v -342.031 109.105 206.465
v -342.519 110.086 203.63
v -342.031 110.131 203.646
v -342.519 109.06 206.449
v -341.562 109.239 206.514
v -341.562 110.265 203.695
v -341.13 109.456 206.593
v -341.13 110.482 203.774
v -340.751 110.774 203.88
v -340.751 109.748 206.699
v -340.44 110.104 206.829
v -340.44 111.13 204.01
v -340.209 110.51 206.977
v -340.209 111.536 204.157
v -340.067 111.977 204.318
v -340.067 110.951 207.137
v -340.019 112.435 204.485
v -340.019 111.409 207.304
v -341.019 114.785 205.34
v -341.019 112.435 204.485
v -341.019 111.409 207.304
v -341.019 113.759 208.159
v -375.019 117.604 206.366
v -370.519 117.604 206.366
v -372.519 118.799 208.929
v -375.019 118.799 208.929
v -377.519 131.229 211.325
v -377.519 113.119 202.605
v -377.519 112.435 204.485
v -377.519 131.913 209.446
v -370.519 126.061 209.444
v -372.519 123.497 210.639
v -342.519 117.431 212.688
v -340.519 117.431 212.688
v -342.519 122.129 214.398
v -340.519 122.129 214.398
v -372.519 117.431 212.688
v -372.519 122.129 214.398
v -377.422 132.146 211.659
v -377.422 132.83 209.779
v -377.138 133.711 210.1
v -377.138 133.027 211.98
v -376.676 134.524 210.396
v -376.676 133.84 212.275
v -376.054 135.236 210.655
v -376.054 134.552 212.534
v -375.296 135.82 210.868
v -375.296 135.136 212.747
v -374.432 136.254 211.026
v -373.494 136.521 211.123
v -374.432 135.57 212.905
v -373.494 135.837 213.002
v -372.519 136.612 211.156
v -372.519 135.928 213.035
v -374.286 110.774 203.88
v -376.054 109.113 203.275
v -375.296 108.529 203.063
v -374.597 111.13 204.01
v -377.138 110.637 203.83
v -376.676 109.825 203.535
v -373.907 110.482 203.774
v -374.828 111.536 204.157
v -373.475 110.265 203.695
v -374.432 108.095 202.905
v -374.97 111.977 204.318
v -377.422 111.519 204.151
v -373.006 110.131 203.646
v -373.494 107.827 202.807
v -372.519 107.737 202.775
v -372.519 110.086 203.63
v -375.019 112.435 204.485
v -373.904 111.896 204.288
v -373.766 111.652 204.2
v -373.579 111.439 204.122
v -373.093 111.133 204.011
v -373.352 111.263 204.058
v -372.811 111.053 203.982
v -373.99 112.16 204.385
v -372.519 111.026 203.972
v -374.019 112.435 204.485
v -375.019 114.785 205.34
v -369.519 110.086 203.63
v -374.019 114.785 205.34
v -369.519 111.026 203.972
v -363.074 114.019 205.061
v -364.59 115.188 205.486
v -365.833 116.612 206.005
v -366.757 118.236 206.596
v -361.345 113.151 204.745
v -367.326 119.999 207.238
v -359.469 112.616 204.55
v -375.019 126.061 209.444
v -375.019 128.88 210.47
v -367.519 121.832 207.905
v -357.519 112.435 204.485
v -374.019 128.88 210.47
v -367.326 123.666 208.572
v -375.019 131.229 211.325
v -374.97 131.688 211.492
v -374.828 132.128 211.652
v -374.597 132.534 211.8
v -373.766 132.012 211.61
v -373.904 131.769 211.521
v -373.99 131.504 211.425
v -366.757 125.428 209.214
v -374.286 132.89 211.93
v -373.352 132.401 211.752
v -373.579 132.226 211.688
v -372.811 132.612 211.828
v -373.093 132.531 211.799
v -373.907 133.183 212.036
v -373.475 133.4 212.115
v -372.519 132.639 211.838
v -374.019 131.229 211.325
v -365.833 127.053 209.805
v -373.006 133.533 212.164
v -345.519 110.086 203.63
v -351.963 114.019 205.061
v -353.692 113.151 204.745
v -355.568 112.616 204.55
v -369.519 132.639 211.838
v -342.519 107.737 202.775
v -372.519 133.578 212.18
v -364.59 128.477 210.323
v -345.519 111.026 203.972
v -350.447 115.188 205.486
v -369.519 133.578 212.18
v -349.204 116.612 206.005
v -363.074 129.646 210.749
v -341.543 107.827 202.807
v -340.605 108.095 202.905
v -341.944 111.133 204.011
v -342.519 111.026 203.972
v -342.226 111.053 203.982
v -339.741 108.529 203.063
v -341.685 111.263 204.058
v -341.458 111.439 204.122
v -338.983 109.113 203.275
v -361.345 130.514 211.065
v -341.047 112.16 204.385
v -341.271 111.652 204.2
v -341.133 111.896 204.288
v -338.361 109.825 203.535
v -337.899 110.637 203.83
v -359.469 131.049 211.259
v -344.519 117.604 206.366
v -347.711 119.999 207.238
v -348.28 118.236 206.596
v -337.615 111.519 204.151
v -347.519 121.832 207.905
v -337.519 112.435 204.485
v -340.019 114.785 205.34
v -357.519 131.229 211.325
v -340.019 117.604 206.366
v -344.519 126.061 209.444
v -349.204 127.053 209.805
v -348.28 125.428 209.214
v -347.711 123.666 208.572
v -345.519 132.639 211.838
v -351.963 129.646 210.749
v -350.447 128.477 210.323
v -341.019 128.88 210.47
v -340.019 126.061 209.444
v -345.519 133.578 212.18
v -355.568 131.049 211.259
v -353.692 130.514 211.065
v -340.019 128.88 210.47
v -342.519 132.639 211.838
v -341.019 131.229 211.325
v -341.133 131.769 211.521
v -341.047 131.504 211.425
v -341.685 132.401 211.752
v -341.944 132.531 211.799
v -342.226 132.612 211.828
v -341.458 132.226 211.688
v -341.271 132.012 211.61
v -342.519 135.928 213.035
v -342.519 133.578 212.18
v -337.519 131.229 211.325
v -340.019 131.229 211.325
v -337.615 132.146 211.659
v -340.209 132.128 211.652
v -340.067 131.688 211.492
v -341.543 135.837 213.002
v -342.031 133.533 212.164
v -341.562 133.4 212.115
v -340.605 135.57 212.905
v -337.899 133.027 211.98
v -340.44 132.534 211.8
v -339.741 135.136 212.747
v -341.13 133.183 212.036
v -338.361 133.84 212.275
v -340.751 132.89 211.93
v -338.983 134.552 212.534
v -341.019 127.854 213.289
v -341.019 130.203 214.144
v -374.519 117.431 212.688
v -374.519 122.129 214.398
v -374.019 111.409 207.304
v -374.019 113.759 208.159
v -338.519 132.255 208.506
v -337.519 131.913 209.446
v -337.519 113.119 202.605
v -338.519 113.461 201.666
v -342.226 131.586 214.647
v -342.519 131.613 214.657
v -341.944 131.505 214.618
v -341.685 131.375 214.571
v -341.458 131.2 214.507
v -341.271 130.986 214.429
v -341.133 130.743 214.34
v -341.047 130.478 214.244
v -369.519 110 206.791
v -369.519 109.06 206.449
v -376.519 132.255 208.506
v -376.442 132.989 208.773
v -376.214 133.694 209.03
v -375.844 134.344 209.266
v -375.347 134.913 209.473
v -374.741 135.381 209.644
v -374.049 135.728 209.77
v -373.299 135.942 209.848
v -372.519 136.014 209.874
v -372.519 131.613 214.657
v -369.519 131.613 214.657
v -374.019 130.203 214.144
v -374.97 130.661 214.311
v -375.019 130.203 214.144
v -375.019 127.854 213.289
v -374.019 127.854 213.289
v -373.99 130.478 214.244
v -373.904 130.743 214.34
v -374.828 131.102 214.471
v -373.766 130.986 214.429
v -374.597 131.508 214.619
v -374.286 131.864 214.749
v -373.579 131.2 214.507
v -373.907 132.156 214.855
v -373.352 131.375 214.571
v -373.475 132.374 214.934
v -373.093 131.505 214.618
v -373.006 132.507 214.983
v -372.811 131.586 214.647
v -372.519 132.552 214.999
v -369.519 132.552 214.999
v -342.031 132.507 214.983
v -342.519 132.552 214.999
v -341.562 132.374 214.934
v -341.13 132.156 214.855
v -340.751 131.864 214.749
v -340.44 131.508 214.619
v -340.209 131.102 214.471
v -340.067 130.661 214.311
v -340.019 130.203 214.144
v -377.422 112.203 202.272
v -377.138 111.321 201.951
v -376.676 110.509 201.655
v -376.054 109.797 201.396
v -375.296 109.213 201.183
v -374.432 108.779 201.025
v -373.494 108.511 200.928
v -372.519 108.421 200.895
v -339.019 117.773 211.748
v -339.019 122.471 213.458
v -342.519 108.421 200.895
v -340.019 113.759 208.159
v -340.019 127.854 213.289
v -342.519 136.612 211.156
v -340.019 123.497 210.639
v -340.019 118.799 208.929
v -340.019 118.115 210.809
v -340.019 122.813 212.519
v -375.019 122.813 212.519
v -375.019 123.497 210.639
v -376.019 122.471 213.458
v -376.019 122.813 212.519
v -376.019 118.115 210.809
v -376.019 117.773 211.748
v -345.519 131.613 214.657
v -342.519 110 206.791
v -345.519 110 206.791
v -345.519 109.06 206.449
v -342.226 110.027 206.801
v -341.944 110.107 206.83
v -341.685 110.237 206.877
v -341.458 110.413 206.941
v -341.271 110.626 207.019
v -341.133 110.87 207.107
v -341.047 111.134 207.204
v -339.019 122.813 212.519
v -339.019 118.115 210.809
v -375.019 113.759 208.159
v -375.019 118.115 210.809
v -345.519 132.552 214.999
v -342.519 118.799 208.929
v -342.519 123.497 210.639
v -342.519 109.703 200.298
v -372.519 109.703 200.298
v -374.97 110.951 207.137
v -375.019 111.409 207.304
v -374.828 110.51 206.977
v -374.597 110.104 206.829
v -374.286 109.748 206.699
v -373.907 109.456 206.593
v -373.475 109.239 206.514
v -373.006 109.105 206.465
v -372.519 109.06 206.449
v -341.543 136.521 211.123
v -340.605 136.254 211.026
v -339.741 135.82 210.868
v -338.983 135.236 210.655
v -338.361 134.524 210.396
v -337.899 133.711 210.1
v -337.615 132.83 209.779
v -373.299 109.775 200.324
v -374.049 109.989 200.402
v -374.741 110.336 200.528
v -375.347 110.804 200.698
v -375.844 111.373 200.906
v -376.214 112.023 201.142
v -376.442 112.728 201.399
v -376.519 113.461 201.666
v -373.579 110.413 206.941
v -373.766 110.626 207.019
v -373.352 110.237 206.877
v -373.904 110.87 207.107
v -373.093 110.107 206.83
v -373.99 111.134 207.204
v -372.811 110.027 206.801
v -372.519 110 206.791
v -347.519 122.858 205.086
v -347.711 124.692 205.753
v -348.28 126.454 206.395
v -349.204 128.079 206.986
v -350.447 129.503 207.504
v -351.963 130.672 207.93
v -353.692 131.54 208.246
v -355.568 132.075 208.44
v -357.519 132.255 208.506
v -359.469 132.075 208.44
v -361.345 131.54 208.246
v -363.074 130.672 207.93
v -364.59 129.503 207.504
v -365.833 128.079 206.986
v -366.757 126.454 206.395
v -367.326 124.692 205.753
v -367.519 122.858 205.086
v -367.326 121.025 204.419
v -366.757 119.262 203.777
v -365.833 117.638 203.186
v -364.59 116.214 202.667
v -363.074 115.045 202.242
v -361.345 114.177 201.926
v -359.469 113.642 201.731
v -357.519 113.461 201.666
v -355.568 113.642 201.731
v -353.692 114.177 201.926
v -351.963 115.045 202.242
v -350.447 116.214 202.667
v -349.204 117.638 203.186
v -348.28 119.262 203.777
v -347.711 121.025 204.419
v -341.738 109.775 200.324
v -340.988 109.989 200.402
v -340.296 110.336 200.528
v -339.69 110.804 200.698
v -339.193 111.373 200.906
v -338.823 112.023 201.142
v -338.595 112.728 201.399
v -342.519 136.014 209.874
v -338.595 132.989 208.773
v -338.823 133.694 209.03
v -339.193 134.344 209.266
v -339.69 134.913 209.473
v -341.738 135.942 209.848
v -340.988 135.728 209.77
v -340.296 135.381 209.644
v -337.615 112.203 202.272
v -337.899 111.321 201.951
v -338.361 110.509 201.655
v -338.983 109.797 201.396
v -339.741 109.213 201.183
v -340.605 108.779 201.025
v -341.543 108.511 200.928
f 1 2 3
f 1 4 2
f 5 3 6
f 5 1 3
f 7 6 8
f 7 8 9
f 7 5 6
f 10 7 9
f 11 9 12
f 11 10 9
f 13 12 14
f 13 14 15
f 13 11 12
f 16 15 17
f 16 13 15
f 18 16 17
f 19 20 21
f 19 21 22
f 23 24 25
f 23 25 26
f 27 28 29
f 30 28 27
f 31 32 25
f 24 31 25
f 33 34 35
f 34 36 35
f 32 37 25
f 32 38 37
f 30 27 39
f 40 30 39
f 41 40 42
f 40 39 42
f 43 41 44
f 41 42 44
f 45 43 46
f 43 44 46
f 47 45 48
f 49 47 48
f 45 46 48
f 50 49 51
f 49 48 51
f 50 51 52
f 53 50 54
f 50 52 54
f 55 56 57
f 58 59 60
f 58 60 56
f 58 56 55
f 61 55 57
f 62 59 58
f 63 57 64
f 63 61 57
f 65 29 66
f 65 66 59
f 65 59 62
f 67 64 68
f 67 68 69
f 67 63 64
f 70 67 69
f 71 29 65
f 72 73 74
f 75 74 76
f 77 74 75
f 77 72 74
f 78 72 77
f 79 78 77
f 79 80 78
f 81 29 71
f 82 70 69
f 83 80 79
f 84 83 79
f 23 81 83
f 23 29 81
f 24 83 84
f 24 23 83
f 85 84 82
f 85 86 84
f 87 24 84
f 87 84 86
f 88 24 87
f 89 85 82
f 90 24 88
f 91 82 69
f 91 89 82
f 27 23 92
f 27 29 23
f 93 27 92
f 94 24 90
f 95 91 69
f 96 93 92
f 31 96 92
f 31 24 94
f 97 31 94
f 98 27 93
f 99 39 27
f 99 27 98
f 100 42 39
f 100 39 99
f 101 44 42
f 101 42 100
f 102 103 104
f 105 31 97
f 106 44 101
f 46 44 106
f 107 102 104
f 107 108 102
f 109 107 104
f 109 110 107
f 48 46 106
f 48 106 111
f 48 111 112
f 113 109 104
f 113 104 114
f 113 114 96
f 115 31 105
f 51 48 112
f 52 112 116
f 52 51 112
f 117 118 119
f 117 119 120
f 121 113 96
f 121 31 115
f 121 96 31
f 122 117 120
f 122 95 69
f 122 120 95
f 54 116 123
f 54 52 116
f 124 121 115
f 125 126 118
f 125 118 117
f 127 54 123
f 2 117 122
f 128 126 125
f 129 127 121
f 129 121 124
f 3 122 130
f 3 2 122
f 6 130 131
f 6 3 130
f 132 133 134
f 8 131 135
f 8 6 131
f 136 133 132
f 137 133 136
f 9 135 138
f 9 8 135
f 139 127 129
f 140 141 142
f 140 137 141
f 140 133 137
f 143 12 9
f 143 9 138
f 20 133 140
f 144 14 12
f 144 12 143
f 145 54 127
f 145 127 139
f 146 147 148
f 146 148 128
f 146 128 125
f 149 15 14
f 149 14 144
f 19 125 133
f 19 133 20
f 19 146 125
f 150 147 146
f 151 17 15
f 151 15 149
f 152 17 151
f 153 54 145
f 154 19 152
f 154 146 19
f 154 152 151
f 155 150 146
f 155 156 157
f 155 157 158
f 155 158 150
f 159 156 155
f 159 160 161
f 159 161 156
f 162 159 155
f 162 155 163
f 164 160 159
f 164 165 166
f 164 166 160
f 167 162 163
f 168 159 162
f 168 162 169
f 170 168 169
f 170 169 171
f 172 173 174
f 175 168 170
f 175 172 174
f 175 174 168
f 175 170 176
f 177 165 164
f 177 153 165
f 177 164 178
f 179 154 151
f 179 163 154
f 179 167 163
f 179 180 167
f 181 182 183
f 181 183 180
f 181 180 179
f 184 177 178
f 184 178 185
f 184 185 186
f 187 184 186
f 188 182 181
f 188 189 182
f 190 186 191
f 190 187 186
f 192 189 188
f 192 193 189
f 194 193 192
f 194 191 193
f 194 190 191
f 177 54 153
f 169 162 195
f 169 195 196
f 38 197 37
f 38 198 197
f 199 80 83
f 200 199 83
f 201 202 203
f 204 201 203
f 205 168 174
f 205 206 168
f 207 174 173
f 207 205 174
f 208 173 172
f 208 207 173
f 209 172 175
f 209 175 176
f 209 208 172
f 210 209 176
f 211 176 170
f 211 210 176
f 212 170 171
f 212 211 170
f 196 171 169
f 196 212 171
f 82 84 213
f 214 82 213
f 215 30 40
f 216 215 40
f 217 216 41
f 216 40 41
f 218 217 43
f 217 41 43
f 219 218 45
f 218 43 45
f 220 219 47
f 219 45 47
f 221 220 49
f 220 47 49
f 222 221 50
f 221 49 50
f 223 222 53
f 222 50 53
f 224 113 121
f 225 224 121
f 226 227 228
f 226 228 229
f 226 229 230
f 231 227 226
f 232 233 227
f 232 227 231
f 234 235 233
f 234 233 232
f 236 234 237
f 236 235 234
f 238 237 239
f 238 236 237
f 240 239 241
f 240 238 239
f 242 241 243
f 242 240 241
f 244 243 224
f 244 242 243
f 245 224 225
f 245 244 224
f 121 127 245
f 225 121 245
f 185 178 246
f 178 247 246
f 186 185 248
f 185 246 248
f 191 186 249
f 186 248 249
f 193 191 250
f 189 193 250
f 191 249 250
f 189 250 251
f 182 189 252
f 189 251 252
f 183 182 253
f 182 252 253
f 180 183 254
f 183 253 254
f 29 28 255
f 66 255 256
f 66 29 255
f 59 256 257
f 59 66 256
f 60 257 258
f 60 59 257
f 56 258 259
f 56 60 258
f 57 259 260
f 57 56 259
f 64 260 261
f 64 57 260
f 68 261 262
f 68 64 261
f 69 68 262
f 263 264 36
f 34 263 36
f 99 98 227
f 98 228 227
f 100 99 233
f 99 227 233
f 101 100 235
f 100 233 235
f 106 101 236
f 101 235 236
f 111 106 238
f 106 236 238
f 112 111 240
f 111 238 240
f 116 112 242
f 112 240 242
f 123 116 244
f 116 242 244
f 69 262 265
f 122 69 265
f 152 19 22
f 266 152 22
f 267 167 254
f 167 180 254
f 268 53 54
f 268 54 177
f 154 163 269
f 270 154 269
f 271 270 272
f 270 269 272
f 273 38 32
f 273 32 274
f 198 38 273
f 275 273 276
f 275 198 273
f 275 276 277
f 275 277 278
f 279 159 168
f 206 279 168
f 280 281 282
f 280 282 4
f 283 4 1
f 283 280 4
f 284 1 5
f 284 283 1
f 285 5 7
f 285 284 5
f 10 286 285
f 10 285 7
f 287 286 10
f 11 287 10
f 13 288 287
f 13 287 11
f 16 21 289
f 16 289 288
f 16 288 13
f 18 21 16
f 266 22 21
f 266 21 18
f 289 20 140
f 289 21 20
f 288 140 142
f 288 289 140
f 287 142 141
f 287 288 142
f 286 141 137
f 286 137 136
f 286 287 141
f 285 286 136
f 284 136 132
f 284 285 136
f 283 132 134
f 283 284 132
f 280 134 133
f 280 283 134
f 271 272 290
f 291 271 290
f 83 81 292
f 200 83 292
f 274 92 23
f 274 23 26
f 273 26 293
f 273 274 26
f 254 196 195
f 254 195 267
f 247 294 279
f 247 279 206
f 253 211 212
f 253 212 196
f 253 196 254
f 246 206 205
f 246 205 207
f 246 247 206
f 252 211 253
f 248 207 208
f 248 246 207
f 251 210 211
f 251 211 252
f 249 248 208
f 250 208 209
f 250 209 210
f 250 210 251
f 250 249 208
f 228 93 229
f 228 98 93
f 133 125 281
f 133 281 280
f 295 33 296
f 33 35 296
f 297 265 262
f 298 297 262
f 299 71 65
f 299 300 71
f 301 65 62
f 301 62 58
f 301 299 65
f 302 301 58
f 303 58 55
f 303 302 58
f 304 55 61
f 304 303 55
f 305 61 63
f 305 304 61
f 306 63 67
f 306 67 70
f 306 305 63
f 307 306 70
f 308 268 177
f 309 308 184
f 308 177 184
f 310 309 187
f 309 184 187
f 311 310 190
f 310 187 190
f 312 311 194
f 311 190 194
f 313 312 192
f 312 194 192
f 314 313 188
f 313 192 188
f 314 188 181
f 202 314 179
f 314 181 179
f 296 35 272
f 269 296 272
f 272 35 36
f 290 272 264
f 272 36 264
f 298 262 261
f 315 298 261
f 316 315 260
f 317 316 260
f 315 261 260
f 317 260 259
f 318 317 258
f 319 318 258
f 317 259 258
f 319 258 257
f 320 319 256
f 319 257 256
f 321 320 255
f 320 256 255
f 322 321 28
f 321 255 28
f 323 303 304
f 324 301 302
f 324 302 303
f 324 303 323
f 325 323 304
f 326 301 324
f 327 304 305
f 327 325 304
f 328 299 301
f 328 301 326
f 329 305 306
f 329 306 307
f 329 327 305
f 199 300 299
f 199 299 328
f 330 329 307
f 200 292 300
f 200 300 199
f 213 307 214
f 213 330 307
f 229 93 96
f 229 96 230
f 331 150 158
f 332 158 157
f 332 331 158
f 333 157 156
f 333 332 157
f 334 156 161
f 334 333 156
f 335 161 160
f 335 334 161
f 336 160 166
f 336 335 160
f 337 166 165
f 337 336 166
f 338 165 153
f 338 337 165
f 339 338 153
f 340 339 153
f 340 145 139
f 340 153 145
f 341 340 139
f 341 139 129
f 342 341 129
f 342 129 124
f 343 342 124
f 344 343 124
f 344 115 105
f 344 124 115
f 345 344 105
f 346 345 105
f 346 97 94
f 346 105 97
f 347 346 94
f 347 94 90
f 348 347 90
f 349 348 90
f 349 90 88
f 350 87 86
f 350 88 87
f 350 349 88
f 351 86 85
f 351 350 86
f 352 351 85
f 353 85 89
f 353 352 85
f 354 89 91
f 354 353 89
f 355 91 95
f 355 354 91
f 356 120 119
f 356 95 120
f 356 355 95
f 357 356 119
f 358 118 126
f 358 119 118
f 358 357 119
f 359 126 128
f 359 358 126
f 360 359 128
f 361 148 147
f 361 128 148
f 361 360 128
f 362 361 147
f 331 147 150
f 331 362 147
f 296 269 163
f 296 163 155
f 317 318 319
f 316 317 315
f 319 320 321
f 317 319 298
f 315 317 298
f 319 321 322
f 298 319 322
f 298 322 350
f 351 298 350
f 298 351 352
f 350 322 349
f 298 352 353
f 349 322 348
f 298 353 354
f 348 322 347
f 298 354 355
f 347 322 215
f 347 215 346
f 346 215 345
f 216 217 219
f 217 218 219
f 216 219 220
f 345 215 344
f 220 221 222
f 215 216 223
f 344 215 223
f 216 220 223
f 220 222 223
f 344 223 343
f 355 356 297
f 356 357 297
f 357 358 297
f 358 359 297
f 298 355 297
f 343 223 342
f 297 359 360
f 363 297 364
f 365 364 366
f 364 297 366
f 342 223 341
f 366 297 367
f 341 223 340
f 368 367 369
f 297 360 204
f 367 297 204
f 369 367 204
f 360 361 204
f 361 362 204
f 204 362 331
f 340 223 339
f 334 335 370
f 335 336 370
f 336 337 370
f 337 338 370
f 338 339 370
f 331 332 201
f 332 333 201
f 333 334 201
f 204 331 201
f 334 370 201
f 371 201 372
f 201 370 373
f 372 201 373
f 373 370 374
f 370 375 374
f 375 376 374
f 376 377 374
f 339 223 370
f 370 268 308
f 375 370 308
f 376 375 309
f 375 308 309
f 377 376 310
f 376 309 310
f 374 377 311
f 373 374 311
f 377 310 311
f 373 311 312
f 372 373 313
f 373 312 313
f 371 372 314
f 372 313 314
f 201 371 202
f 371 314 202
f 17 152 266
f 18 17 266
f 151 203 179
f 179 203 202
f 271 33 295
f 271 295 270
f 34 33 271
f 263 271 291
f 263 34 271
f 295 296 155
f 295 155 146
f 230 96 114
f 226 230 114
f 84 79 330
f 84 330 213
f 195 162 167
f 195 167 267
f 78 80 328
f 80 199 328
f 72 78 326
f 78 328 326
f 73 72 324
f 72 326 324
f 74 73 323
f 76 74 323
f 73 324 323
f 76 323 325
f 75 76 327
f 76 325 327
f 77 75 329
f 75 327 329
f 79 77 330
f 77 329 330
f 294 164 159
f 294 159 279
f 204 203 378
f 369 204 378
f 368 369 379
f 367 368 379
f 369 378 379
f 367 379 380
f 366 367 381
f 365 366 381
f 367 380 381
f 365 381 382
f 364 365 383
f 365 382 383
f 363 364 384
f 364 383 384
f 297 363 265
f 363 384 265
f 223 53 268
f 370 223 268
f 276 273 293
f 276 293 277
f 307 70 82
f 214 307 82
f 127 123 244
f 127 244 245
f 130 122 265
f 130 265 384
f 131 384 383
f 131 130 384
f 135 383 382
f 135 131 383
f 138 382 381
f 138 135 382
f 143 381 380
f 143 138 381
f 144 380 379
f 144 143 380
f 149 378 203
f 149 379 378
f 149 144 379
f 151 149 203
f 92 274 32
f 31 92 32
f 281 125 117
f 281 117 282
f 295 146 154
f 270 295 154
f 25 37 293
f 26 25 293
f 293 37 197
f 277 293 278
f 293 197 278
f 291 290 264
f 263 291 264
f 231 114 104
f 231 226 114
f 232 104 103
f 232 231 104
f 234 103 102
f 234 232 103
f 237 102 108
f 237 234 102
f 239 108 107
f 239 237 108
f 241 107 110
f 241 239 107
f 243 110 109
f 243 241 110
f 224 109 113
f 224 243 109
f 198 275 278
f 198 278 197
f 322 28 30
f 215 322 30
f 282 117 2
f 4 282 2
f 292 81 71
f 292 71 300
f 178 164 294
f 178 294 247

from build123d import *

# Parameters (mm, degrees)
SKETCH117_W             = 40
SKETCH117_H             = 30
SKETCH117_R             = 10
PAD021_DEPTH            = 3
SKETCH118_W             = 35
SKETCH118_H             = 25
SKETCH118_W_2           = 33
SKETCH118_H_2           = 23
PAD022_DEPTH            = 3
FILLET013_R             = 5
FILLET014_R             = 1.5
FILLET016_R             = 2.5
PAD023_DEPTH            = 2.5
SKETCH121_W             = 5
SKETCH121_H             = 3
POCKET043_DEPTH         = 37.501
CHAMFER002_SIZE         = 2
SKETCH122_W             = 24
SKETCH122_H             = 3
POCKET044_DEPTH         = 27.501
CHAMFER003_SIZE         = 1
BODY010_PLACEMENT_ANGLE = 20


with BuildPart() as part:
    # Sketch117 → Pad021 (new body)
    with BuildSketch(Plane.XY):
        Rectangle(SKETCH117_W, SKETCH117_H)
        Circle(SKETCH117_R, mode=Mode.SUBTRACT)
    extrude(amount=PAD021_DEPTH)

    # Sketch118 (on Face7 of Pad021) → Pad022 (join)
    with BuildSketch(Plane.XY.offset(3)):
        Rectangle(SKETCH118_W, SKETCH118_H)
        Rectangle(SKETCH118_W_2, SKETCH118_H_2, mode=Mode.SUBTRACT)
    extrude(amount=PAD022_DEPTH)

    # Fillet013
    fillet013_edges = [part.edges().sort_by_distance(p)[0] for p in [
        (20, -15, 1.5),
        (20, 15, 1.5),
        (-20, 15, 1.5),
        (-20, -15, 1.5),
    ]]
    fillet(fillet013_edges, radius=FILLET013_R)

    # Fillet014
    fillet014_edges = [part.edges().sort_by_distance(p)[0] for p in [
        (16.5, 11.5, 4.5),
        (16.5, -11.5, 4.5),
        (-16.5, -11.5, 4.5),
        (-16.5, 11.5, 4.5),
    ]]
    fillet(fillet014_edges, radius=FILLET014_R)

    # Fillet016
    fillet016_edges = [part.edges().sort_by_distance(p)[0] for p in [
        (-17.5, -12.5, 4.5),
        (-17.5, 12.5, 4.5),
        (17.5, 12.5, 4.5),
        (17.5, -12.5, 4.5),
    ]]
    fillet(fillet016_edges, radius=FILLET016_R)

    # Sketch119 (on Face14 of Fillet014) → Pad023 (join, symmetric)
    with BuildSketch(Plane(origin=(0, 0, 0), x_dir=(-1, 0, 0), z_dir=(0, 1, 0))):
        Polygon((15, 3), (17.5, 3), (17.5, 7), (18.5, 7), (18.5, 8), (17, 9), (15, 9), align=None)
    pad023 = extrude(amount=PAD023_DEPTH, both=True)

    # Mirrored003: Pad023 across Sketch119 V_Axis
    add(pad023.mirror(Plane(origin=(0, 0, 0), x_dir=(0, 1, 0), z_dir=(-1, 0, 0))))

    # Sketch121 (on Face5 of Mirrored003) → Pocket043 (cut, through all)
    with BuildSketch(Plane(origin=(-17.5, 0, 0), x_dir=(0, -1, 0), z_dir=(-1, 0, 0))):
        with Locations((-5, 4.5)):
            Rectangle(SKETCH121_W, SKETCH121_H)
        with Locations((5, 4.5)):
            Rectangle(SKETCH121_W, SKETCH121_H)
    extrude(amount=-POCKET043_DEPTH, mode=Mode.SUBTRACT)

    # Chamfer002
    chamfer002_edges = [part.edges().sort_by_distance(p)[0] for p in [
        (-16.25, -2.5, 3),
        (-15, 0, 3),
        (-16.25, 2.5, 3),
        (16.25, 2.5, 3),
        (15, 0, 3),
        (16.25, -2.5, 3),
    ]]
    chamfer(chamfer002_edges, length=CHAMFER002_SIZE)

    # Sketch122 (on Face36 of Chamfer002) → Pocket044 (cut, through all)
    with BuildSketch(Plane(origin=(0, 12.5, 0), x_dir=(-1, 0, 0), z_dir=(0, 1, 0))):
        with Locations((0, 4.5)):
            Rectangle(SKETCH122_W, SKETCH122_H)
    extrude(amount=-POCKET044_DEPTH, mode=Mode.SUBTRACT)

    # Chamfer003
    chamfer003_edges = [part.edges().sort_by_distance(p)[0] for p in [
        (0, 15, 0),
    ]]
    chamfer(chamfer003_edges, length=CHAMFER003_SIZE)


with BuildPart() as part_1:
    # Body010 placement: moved
    add(part.part.moved(Location((-357.518507, 122.858339, 205.085809))).rotate(Axis((-357.518507, 122.858339, 205.085809), (1, 0, 0)), BODY010_PLACEMENT_ANGLE))


solid = part_1.part
